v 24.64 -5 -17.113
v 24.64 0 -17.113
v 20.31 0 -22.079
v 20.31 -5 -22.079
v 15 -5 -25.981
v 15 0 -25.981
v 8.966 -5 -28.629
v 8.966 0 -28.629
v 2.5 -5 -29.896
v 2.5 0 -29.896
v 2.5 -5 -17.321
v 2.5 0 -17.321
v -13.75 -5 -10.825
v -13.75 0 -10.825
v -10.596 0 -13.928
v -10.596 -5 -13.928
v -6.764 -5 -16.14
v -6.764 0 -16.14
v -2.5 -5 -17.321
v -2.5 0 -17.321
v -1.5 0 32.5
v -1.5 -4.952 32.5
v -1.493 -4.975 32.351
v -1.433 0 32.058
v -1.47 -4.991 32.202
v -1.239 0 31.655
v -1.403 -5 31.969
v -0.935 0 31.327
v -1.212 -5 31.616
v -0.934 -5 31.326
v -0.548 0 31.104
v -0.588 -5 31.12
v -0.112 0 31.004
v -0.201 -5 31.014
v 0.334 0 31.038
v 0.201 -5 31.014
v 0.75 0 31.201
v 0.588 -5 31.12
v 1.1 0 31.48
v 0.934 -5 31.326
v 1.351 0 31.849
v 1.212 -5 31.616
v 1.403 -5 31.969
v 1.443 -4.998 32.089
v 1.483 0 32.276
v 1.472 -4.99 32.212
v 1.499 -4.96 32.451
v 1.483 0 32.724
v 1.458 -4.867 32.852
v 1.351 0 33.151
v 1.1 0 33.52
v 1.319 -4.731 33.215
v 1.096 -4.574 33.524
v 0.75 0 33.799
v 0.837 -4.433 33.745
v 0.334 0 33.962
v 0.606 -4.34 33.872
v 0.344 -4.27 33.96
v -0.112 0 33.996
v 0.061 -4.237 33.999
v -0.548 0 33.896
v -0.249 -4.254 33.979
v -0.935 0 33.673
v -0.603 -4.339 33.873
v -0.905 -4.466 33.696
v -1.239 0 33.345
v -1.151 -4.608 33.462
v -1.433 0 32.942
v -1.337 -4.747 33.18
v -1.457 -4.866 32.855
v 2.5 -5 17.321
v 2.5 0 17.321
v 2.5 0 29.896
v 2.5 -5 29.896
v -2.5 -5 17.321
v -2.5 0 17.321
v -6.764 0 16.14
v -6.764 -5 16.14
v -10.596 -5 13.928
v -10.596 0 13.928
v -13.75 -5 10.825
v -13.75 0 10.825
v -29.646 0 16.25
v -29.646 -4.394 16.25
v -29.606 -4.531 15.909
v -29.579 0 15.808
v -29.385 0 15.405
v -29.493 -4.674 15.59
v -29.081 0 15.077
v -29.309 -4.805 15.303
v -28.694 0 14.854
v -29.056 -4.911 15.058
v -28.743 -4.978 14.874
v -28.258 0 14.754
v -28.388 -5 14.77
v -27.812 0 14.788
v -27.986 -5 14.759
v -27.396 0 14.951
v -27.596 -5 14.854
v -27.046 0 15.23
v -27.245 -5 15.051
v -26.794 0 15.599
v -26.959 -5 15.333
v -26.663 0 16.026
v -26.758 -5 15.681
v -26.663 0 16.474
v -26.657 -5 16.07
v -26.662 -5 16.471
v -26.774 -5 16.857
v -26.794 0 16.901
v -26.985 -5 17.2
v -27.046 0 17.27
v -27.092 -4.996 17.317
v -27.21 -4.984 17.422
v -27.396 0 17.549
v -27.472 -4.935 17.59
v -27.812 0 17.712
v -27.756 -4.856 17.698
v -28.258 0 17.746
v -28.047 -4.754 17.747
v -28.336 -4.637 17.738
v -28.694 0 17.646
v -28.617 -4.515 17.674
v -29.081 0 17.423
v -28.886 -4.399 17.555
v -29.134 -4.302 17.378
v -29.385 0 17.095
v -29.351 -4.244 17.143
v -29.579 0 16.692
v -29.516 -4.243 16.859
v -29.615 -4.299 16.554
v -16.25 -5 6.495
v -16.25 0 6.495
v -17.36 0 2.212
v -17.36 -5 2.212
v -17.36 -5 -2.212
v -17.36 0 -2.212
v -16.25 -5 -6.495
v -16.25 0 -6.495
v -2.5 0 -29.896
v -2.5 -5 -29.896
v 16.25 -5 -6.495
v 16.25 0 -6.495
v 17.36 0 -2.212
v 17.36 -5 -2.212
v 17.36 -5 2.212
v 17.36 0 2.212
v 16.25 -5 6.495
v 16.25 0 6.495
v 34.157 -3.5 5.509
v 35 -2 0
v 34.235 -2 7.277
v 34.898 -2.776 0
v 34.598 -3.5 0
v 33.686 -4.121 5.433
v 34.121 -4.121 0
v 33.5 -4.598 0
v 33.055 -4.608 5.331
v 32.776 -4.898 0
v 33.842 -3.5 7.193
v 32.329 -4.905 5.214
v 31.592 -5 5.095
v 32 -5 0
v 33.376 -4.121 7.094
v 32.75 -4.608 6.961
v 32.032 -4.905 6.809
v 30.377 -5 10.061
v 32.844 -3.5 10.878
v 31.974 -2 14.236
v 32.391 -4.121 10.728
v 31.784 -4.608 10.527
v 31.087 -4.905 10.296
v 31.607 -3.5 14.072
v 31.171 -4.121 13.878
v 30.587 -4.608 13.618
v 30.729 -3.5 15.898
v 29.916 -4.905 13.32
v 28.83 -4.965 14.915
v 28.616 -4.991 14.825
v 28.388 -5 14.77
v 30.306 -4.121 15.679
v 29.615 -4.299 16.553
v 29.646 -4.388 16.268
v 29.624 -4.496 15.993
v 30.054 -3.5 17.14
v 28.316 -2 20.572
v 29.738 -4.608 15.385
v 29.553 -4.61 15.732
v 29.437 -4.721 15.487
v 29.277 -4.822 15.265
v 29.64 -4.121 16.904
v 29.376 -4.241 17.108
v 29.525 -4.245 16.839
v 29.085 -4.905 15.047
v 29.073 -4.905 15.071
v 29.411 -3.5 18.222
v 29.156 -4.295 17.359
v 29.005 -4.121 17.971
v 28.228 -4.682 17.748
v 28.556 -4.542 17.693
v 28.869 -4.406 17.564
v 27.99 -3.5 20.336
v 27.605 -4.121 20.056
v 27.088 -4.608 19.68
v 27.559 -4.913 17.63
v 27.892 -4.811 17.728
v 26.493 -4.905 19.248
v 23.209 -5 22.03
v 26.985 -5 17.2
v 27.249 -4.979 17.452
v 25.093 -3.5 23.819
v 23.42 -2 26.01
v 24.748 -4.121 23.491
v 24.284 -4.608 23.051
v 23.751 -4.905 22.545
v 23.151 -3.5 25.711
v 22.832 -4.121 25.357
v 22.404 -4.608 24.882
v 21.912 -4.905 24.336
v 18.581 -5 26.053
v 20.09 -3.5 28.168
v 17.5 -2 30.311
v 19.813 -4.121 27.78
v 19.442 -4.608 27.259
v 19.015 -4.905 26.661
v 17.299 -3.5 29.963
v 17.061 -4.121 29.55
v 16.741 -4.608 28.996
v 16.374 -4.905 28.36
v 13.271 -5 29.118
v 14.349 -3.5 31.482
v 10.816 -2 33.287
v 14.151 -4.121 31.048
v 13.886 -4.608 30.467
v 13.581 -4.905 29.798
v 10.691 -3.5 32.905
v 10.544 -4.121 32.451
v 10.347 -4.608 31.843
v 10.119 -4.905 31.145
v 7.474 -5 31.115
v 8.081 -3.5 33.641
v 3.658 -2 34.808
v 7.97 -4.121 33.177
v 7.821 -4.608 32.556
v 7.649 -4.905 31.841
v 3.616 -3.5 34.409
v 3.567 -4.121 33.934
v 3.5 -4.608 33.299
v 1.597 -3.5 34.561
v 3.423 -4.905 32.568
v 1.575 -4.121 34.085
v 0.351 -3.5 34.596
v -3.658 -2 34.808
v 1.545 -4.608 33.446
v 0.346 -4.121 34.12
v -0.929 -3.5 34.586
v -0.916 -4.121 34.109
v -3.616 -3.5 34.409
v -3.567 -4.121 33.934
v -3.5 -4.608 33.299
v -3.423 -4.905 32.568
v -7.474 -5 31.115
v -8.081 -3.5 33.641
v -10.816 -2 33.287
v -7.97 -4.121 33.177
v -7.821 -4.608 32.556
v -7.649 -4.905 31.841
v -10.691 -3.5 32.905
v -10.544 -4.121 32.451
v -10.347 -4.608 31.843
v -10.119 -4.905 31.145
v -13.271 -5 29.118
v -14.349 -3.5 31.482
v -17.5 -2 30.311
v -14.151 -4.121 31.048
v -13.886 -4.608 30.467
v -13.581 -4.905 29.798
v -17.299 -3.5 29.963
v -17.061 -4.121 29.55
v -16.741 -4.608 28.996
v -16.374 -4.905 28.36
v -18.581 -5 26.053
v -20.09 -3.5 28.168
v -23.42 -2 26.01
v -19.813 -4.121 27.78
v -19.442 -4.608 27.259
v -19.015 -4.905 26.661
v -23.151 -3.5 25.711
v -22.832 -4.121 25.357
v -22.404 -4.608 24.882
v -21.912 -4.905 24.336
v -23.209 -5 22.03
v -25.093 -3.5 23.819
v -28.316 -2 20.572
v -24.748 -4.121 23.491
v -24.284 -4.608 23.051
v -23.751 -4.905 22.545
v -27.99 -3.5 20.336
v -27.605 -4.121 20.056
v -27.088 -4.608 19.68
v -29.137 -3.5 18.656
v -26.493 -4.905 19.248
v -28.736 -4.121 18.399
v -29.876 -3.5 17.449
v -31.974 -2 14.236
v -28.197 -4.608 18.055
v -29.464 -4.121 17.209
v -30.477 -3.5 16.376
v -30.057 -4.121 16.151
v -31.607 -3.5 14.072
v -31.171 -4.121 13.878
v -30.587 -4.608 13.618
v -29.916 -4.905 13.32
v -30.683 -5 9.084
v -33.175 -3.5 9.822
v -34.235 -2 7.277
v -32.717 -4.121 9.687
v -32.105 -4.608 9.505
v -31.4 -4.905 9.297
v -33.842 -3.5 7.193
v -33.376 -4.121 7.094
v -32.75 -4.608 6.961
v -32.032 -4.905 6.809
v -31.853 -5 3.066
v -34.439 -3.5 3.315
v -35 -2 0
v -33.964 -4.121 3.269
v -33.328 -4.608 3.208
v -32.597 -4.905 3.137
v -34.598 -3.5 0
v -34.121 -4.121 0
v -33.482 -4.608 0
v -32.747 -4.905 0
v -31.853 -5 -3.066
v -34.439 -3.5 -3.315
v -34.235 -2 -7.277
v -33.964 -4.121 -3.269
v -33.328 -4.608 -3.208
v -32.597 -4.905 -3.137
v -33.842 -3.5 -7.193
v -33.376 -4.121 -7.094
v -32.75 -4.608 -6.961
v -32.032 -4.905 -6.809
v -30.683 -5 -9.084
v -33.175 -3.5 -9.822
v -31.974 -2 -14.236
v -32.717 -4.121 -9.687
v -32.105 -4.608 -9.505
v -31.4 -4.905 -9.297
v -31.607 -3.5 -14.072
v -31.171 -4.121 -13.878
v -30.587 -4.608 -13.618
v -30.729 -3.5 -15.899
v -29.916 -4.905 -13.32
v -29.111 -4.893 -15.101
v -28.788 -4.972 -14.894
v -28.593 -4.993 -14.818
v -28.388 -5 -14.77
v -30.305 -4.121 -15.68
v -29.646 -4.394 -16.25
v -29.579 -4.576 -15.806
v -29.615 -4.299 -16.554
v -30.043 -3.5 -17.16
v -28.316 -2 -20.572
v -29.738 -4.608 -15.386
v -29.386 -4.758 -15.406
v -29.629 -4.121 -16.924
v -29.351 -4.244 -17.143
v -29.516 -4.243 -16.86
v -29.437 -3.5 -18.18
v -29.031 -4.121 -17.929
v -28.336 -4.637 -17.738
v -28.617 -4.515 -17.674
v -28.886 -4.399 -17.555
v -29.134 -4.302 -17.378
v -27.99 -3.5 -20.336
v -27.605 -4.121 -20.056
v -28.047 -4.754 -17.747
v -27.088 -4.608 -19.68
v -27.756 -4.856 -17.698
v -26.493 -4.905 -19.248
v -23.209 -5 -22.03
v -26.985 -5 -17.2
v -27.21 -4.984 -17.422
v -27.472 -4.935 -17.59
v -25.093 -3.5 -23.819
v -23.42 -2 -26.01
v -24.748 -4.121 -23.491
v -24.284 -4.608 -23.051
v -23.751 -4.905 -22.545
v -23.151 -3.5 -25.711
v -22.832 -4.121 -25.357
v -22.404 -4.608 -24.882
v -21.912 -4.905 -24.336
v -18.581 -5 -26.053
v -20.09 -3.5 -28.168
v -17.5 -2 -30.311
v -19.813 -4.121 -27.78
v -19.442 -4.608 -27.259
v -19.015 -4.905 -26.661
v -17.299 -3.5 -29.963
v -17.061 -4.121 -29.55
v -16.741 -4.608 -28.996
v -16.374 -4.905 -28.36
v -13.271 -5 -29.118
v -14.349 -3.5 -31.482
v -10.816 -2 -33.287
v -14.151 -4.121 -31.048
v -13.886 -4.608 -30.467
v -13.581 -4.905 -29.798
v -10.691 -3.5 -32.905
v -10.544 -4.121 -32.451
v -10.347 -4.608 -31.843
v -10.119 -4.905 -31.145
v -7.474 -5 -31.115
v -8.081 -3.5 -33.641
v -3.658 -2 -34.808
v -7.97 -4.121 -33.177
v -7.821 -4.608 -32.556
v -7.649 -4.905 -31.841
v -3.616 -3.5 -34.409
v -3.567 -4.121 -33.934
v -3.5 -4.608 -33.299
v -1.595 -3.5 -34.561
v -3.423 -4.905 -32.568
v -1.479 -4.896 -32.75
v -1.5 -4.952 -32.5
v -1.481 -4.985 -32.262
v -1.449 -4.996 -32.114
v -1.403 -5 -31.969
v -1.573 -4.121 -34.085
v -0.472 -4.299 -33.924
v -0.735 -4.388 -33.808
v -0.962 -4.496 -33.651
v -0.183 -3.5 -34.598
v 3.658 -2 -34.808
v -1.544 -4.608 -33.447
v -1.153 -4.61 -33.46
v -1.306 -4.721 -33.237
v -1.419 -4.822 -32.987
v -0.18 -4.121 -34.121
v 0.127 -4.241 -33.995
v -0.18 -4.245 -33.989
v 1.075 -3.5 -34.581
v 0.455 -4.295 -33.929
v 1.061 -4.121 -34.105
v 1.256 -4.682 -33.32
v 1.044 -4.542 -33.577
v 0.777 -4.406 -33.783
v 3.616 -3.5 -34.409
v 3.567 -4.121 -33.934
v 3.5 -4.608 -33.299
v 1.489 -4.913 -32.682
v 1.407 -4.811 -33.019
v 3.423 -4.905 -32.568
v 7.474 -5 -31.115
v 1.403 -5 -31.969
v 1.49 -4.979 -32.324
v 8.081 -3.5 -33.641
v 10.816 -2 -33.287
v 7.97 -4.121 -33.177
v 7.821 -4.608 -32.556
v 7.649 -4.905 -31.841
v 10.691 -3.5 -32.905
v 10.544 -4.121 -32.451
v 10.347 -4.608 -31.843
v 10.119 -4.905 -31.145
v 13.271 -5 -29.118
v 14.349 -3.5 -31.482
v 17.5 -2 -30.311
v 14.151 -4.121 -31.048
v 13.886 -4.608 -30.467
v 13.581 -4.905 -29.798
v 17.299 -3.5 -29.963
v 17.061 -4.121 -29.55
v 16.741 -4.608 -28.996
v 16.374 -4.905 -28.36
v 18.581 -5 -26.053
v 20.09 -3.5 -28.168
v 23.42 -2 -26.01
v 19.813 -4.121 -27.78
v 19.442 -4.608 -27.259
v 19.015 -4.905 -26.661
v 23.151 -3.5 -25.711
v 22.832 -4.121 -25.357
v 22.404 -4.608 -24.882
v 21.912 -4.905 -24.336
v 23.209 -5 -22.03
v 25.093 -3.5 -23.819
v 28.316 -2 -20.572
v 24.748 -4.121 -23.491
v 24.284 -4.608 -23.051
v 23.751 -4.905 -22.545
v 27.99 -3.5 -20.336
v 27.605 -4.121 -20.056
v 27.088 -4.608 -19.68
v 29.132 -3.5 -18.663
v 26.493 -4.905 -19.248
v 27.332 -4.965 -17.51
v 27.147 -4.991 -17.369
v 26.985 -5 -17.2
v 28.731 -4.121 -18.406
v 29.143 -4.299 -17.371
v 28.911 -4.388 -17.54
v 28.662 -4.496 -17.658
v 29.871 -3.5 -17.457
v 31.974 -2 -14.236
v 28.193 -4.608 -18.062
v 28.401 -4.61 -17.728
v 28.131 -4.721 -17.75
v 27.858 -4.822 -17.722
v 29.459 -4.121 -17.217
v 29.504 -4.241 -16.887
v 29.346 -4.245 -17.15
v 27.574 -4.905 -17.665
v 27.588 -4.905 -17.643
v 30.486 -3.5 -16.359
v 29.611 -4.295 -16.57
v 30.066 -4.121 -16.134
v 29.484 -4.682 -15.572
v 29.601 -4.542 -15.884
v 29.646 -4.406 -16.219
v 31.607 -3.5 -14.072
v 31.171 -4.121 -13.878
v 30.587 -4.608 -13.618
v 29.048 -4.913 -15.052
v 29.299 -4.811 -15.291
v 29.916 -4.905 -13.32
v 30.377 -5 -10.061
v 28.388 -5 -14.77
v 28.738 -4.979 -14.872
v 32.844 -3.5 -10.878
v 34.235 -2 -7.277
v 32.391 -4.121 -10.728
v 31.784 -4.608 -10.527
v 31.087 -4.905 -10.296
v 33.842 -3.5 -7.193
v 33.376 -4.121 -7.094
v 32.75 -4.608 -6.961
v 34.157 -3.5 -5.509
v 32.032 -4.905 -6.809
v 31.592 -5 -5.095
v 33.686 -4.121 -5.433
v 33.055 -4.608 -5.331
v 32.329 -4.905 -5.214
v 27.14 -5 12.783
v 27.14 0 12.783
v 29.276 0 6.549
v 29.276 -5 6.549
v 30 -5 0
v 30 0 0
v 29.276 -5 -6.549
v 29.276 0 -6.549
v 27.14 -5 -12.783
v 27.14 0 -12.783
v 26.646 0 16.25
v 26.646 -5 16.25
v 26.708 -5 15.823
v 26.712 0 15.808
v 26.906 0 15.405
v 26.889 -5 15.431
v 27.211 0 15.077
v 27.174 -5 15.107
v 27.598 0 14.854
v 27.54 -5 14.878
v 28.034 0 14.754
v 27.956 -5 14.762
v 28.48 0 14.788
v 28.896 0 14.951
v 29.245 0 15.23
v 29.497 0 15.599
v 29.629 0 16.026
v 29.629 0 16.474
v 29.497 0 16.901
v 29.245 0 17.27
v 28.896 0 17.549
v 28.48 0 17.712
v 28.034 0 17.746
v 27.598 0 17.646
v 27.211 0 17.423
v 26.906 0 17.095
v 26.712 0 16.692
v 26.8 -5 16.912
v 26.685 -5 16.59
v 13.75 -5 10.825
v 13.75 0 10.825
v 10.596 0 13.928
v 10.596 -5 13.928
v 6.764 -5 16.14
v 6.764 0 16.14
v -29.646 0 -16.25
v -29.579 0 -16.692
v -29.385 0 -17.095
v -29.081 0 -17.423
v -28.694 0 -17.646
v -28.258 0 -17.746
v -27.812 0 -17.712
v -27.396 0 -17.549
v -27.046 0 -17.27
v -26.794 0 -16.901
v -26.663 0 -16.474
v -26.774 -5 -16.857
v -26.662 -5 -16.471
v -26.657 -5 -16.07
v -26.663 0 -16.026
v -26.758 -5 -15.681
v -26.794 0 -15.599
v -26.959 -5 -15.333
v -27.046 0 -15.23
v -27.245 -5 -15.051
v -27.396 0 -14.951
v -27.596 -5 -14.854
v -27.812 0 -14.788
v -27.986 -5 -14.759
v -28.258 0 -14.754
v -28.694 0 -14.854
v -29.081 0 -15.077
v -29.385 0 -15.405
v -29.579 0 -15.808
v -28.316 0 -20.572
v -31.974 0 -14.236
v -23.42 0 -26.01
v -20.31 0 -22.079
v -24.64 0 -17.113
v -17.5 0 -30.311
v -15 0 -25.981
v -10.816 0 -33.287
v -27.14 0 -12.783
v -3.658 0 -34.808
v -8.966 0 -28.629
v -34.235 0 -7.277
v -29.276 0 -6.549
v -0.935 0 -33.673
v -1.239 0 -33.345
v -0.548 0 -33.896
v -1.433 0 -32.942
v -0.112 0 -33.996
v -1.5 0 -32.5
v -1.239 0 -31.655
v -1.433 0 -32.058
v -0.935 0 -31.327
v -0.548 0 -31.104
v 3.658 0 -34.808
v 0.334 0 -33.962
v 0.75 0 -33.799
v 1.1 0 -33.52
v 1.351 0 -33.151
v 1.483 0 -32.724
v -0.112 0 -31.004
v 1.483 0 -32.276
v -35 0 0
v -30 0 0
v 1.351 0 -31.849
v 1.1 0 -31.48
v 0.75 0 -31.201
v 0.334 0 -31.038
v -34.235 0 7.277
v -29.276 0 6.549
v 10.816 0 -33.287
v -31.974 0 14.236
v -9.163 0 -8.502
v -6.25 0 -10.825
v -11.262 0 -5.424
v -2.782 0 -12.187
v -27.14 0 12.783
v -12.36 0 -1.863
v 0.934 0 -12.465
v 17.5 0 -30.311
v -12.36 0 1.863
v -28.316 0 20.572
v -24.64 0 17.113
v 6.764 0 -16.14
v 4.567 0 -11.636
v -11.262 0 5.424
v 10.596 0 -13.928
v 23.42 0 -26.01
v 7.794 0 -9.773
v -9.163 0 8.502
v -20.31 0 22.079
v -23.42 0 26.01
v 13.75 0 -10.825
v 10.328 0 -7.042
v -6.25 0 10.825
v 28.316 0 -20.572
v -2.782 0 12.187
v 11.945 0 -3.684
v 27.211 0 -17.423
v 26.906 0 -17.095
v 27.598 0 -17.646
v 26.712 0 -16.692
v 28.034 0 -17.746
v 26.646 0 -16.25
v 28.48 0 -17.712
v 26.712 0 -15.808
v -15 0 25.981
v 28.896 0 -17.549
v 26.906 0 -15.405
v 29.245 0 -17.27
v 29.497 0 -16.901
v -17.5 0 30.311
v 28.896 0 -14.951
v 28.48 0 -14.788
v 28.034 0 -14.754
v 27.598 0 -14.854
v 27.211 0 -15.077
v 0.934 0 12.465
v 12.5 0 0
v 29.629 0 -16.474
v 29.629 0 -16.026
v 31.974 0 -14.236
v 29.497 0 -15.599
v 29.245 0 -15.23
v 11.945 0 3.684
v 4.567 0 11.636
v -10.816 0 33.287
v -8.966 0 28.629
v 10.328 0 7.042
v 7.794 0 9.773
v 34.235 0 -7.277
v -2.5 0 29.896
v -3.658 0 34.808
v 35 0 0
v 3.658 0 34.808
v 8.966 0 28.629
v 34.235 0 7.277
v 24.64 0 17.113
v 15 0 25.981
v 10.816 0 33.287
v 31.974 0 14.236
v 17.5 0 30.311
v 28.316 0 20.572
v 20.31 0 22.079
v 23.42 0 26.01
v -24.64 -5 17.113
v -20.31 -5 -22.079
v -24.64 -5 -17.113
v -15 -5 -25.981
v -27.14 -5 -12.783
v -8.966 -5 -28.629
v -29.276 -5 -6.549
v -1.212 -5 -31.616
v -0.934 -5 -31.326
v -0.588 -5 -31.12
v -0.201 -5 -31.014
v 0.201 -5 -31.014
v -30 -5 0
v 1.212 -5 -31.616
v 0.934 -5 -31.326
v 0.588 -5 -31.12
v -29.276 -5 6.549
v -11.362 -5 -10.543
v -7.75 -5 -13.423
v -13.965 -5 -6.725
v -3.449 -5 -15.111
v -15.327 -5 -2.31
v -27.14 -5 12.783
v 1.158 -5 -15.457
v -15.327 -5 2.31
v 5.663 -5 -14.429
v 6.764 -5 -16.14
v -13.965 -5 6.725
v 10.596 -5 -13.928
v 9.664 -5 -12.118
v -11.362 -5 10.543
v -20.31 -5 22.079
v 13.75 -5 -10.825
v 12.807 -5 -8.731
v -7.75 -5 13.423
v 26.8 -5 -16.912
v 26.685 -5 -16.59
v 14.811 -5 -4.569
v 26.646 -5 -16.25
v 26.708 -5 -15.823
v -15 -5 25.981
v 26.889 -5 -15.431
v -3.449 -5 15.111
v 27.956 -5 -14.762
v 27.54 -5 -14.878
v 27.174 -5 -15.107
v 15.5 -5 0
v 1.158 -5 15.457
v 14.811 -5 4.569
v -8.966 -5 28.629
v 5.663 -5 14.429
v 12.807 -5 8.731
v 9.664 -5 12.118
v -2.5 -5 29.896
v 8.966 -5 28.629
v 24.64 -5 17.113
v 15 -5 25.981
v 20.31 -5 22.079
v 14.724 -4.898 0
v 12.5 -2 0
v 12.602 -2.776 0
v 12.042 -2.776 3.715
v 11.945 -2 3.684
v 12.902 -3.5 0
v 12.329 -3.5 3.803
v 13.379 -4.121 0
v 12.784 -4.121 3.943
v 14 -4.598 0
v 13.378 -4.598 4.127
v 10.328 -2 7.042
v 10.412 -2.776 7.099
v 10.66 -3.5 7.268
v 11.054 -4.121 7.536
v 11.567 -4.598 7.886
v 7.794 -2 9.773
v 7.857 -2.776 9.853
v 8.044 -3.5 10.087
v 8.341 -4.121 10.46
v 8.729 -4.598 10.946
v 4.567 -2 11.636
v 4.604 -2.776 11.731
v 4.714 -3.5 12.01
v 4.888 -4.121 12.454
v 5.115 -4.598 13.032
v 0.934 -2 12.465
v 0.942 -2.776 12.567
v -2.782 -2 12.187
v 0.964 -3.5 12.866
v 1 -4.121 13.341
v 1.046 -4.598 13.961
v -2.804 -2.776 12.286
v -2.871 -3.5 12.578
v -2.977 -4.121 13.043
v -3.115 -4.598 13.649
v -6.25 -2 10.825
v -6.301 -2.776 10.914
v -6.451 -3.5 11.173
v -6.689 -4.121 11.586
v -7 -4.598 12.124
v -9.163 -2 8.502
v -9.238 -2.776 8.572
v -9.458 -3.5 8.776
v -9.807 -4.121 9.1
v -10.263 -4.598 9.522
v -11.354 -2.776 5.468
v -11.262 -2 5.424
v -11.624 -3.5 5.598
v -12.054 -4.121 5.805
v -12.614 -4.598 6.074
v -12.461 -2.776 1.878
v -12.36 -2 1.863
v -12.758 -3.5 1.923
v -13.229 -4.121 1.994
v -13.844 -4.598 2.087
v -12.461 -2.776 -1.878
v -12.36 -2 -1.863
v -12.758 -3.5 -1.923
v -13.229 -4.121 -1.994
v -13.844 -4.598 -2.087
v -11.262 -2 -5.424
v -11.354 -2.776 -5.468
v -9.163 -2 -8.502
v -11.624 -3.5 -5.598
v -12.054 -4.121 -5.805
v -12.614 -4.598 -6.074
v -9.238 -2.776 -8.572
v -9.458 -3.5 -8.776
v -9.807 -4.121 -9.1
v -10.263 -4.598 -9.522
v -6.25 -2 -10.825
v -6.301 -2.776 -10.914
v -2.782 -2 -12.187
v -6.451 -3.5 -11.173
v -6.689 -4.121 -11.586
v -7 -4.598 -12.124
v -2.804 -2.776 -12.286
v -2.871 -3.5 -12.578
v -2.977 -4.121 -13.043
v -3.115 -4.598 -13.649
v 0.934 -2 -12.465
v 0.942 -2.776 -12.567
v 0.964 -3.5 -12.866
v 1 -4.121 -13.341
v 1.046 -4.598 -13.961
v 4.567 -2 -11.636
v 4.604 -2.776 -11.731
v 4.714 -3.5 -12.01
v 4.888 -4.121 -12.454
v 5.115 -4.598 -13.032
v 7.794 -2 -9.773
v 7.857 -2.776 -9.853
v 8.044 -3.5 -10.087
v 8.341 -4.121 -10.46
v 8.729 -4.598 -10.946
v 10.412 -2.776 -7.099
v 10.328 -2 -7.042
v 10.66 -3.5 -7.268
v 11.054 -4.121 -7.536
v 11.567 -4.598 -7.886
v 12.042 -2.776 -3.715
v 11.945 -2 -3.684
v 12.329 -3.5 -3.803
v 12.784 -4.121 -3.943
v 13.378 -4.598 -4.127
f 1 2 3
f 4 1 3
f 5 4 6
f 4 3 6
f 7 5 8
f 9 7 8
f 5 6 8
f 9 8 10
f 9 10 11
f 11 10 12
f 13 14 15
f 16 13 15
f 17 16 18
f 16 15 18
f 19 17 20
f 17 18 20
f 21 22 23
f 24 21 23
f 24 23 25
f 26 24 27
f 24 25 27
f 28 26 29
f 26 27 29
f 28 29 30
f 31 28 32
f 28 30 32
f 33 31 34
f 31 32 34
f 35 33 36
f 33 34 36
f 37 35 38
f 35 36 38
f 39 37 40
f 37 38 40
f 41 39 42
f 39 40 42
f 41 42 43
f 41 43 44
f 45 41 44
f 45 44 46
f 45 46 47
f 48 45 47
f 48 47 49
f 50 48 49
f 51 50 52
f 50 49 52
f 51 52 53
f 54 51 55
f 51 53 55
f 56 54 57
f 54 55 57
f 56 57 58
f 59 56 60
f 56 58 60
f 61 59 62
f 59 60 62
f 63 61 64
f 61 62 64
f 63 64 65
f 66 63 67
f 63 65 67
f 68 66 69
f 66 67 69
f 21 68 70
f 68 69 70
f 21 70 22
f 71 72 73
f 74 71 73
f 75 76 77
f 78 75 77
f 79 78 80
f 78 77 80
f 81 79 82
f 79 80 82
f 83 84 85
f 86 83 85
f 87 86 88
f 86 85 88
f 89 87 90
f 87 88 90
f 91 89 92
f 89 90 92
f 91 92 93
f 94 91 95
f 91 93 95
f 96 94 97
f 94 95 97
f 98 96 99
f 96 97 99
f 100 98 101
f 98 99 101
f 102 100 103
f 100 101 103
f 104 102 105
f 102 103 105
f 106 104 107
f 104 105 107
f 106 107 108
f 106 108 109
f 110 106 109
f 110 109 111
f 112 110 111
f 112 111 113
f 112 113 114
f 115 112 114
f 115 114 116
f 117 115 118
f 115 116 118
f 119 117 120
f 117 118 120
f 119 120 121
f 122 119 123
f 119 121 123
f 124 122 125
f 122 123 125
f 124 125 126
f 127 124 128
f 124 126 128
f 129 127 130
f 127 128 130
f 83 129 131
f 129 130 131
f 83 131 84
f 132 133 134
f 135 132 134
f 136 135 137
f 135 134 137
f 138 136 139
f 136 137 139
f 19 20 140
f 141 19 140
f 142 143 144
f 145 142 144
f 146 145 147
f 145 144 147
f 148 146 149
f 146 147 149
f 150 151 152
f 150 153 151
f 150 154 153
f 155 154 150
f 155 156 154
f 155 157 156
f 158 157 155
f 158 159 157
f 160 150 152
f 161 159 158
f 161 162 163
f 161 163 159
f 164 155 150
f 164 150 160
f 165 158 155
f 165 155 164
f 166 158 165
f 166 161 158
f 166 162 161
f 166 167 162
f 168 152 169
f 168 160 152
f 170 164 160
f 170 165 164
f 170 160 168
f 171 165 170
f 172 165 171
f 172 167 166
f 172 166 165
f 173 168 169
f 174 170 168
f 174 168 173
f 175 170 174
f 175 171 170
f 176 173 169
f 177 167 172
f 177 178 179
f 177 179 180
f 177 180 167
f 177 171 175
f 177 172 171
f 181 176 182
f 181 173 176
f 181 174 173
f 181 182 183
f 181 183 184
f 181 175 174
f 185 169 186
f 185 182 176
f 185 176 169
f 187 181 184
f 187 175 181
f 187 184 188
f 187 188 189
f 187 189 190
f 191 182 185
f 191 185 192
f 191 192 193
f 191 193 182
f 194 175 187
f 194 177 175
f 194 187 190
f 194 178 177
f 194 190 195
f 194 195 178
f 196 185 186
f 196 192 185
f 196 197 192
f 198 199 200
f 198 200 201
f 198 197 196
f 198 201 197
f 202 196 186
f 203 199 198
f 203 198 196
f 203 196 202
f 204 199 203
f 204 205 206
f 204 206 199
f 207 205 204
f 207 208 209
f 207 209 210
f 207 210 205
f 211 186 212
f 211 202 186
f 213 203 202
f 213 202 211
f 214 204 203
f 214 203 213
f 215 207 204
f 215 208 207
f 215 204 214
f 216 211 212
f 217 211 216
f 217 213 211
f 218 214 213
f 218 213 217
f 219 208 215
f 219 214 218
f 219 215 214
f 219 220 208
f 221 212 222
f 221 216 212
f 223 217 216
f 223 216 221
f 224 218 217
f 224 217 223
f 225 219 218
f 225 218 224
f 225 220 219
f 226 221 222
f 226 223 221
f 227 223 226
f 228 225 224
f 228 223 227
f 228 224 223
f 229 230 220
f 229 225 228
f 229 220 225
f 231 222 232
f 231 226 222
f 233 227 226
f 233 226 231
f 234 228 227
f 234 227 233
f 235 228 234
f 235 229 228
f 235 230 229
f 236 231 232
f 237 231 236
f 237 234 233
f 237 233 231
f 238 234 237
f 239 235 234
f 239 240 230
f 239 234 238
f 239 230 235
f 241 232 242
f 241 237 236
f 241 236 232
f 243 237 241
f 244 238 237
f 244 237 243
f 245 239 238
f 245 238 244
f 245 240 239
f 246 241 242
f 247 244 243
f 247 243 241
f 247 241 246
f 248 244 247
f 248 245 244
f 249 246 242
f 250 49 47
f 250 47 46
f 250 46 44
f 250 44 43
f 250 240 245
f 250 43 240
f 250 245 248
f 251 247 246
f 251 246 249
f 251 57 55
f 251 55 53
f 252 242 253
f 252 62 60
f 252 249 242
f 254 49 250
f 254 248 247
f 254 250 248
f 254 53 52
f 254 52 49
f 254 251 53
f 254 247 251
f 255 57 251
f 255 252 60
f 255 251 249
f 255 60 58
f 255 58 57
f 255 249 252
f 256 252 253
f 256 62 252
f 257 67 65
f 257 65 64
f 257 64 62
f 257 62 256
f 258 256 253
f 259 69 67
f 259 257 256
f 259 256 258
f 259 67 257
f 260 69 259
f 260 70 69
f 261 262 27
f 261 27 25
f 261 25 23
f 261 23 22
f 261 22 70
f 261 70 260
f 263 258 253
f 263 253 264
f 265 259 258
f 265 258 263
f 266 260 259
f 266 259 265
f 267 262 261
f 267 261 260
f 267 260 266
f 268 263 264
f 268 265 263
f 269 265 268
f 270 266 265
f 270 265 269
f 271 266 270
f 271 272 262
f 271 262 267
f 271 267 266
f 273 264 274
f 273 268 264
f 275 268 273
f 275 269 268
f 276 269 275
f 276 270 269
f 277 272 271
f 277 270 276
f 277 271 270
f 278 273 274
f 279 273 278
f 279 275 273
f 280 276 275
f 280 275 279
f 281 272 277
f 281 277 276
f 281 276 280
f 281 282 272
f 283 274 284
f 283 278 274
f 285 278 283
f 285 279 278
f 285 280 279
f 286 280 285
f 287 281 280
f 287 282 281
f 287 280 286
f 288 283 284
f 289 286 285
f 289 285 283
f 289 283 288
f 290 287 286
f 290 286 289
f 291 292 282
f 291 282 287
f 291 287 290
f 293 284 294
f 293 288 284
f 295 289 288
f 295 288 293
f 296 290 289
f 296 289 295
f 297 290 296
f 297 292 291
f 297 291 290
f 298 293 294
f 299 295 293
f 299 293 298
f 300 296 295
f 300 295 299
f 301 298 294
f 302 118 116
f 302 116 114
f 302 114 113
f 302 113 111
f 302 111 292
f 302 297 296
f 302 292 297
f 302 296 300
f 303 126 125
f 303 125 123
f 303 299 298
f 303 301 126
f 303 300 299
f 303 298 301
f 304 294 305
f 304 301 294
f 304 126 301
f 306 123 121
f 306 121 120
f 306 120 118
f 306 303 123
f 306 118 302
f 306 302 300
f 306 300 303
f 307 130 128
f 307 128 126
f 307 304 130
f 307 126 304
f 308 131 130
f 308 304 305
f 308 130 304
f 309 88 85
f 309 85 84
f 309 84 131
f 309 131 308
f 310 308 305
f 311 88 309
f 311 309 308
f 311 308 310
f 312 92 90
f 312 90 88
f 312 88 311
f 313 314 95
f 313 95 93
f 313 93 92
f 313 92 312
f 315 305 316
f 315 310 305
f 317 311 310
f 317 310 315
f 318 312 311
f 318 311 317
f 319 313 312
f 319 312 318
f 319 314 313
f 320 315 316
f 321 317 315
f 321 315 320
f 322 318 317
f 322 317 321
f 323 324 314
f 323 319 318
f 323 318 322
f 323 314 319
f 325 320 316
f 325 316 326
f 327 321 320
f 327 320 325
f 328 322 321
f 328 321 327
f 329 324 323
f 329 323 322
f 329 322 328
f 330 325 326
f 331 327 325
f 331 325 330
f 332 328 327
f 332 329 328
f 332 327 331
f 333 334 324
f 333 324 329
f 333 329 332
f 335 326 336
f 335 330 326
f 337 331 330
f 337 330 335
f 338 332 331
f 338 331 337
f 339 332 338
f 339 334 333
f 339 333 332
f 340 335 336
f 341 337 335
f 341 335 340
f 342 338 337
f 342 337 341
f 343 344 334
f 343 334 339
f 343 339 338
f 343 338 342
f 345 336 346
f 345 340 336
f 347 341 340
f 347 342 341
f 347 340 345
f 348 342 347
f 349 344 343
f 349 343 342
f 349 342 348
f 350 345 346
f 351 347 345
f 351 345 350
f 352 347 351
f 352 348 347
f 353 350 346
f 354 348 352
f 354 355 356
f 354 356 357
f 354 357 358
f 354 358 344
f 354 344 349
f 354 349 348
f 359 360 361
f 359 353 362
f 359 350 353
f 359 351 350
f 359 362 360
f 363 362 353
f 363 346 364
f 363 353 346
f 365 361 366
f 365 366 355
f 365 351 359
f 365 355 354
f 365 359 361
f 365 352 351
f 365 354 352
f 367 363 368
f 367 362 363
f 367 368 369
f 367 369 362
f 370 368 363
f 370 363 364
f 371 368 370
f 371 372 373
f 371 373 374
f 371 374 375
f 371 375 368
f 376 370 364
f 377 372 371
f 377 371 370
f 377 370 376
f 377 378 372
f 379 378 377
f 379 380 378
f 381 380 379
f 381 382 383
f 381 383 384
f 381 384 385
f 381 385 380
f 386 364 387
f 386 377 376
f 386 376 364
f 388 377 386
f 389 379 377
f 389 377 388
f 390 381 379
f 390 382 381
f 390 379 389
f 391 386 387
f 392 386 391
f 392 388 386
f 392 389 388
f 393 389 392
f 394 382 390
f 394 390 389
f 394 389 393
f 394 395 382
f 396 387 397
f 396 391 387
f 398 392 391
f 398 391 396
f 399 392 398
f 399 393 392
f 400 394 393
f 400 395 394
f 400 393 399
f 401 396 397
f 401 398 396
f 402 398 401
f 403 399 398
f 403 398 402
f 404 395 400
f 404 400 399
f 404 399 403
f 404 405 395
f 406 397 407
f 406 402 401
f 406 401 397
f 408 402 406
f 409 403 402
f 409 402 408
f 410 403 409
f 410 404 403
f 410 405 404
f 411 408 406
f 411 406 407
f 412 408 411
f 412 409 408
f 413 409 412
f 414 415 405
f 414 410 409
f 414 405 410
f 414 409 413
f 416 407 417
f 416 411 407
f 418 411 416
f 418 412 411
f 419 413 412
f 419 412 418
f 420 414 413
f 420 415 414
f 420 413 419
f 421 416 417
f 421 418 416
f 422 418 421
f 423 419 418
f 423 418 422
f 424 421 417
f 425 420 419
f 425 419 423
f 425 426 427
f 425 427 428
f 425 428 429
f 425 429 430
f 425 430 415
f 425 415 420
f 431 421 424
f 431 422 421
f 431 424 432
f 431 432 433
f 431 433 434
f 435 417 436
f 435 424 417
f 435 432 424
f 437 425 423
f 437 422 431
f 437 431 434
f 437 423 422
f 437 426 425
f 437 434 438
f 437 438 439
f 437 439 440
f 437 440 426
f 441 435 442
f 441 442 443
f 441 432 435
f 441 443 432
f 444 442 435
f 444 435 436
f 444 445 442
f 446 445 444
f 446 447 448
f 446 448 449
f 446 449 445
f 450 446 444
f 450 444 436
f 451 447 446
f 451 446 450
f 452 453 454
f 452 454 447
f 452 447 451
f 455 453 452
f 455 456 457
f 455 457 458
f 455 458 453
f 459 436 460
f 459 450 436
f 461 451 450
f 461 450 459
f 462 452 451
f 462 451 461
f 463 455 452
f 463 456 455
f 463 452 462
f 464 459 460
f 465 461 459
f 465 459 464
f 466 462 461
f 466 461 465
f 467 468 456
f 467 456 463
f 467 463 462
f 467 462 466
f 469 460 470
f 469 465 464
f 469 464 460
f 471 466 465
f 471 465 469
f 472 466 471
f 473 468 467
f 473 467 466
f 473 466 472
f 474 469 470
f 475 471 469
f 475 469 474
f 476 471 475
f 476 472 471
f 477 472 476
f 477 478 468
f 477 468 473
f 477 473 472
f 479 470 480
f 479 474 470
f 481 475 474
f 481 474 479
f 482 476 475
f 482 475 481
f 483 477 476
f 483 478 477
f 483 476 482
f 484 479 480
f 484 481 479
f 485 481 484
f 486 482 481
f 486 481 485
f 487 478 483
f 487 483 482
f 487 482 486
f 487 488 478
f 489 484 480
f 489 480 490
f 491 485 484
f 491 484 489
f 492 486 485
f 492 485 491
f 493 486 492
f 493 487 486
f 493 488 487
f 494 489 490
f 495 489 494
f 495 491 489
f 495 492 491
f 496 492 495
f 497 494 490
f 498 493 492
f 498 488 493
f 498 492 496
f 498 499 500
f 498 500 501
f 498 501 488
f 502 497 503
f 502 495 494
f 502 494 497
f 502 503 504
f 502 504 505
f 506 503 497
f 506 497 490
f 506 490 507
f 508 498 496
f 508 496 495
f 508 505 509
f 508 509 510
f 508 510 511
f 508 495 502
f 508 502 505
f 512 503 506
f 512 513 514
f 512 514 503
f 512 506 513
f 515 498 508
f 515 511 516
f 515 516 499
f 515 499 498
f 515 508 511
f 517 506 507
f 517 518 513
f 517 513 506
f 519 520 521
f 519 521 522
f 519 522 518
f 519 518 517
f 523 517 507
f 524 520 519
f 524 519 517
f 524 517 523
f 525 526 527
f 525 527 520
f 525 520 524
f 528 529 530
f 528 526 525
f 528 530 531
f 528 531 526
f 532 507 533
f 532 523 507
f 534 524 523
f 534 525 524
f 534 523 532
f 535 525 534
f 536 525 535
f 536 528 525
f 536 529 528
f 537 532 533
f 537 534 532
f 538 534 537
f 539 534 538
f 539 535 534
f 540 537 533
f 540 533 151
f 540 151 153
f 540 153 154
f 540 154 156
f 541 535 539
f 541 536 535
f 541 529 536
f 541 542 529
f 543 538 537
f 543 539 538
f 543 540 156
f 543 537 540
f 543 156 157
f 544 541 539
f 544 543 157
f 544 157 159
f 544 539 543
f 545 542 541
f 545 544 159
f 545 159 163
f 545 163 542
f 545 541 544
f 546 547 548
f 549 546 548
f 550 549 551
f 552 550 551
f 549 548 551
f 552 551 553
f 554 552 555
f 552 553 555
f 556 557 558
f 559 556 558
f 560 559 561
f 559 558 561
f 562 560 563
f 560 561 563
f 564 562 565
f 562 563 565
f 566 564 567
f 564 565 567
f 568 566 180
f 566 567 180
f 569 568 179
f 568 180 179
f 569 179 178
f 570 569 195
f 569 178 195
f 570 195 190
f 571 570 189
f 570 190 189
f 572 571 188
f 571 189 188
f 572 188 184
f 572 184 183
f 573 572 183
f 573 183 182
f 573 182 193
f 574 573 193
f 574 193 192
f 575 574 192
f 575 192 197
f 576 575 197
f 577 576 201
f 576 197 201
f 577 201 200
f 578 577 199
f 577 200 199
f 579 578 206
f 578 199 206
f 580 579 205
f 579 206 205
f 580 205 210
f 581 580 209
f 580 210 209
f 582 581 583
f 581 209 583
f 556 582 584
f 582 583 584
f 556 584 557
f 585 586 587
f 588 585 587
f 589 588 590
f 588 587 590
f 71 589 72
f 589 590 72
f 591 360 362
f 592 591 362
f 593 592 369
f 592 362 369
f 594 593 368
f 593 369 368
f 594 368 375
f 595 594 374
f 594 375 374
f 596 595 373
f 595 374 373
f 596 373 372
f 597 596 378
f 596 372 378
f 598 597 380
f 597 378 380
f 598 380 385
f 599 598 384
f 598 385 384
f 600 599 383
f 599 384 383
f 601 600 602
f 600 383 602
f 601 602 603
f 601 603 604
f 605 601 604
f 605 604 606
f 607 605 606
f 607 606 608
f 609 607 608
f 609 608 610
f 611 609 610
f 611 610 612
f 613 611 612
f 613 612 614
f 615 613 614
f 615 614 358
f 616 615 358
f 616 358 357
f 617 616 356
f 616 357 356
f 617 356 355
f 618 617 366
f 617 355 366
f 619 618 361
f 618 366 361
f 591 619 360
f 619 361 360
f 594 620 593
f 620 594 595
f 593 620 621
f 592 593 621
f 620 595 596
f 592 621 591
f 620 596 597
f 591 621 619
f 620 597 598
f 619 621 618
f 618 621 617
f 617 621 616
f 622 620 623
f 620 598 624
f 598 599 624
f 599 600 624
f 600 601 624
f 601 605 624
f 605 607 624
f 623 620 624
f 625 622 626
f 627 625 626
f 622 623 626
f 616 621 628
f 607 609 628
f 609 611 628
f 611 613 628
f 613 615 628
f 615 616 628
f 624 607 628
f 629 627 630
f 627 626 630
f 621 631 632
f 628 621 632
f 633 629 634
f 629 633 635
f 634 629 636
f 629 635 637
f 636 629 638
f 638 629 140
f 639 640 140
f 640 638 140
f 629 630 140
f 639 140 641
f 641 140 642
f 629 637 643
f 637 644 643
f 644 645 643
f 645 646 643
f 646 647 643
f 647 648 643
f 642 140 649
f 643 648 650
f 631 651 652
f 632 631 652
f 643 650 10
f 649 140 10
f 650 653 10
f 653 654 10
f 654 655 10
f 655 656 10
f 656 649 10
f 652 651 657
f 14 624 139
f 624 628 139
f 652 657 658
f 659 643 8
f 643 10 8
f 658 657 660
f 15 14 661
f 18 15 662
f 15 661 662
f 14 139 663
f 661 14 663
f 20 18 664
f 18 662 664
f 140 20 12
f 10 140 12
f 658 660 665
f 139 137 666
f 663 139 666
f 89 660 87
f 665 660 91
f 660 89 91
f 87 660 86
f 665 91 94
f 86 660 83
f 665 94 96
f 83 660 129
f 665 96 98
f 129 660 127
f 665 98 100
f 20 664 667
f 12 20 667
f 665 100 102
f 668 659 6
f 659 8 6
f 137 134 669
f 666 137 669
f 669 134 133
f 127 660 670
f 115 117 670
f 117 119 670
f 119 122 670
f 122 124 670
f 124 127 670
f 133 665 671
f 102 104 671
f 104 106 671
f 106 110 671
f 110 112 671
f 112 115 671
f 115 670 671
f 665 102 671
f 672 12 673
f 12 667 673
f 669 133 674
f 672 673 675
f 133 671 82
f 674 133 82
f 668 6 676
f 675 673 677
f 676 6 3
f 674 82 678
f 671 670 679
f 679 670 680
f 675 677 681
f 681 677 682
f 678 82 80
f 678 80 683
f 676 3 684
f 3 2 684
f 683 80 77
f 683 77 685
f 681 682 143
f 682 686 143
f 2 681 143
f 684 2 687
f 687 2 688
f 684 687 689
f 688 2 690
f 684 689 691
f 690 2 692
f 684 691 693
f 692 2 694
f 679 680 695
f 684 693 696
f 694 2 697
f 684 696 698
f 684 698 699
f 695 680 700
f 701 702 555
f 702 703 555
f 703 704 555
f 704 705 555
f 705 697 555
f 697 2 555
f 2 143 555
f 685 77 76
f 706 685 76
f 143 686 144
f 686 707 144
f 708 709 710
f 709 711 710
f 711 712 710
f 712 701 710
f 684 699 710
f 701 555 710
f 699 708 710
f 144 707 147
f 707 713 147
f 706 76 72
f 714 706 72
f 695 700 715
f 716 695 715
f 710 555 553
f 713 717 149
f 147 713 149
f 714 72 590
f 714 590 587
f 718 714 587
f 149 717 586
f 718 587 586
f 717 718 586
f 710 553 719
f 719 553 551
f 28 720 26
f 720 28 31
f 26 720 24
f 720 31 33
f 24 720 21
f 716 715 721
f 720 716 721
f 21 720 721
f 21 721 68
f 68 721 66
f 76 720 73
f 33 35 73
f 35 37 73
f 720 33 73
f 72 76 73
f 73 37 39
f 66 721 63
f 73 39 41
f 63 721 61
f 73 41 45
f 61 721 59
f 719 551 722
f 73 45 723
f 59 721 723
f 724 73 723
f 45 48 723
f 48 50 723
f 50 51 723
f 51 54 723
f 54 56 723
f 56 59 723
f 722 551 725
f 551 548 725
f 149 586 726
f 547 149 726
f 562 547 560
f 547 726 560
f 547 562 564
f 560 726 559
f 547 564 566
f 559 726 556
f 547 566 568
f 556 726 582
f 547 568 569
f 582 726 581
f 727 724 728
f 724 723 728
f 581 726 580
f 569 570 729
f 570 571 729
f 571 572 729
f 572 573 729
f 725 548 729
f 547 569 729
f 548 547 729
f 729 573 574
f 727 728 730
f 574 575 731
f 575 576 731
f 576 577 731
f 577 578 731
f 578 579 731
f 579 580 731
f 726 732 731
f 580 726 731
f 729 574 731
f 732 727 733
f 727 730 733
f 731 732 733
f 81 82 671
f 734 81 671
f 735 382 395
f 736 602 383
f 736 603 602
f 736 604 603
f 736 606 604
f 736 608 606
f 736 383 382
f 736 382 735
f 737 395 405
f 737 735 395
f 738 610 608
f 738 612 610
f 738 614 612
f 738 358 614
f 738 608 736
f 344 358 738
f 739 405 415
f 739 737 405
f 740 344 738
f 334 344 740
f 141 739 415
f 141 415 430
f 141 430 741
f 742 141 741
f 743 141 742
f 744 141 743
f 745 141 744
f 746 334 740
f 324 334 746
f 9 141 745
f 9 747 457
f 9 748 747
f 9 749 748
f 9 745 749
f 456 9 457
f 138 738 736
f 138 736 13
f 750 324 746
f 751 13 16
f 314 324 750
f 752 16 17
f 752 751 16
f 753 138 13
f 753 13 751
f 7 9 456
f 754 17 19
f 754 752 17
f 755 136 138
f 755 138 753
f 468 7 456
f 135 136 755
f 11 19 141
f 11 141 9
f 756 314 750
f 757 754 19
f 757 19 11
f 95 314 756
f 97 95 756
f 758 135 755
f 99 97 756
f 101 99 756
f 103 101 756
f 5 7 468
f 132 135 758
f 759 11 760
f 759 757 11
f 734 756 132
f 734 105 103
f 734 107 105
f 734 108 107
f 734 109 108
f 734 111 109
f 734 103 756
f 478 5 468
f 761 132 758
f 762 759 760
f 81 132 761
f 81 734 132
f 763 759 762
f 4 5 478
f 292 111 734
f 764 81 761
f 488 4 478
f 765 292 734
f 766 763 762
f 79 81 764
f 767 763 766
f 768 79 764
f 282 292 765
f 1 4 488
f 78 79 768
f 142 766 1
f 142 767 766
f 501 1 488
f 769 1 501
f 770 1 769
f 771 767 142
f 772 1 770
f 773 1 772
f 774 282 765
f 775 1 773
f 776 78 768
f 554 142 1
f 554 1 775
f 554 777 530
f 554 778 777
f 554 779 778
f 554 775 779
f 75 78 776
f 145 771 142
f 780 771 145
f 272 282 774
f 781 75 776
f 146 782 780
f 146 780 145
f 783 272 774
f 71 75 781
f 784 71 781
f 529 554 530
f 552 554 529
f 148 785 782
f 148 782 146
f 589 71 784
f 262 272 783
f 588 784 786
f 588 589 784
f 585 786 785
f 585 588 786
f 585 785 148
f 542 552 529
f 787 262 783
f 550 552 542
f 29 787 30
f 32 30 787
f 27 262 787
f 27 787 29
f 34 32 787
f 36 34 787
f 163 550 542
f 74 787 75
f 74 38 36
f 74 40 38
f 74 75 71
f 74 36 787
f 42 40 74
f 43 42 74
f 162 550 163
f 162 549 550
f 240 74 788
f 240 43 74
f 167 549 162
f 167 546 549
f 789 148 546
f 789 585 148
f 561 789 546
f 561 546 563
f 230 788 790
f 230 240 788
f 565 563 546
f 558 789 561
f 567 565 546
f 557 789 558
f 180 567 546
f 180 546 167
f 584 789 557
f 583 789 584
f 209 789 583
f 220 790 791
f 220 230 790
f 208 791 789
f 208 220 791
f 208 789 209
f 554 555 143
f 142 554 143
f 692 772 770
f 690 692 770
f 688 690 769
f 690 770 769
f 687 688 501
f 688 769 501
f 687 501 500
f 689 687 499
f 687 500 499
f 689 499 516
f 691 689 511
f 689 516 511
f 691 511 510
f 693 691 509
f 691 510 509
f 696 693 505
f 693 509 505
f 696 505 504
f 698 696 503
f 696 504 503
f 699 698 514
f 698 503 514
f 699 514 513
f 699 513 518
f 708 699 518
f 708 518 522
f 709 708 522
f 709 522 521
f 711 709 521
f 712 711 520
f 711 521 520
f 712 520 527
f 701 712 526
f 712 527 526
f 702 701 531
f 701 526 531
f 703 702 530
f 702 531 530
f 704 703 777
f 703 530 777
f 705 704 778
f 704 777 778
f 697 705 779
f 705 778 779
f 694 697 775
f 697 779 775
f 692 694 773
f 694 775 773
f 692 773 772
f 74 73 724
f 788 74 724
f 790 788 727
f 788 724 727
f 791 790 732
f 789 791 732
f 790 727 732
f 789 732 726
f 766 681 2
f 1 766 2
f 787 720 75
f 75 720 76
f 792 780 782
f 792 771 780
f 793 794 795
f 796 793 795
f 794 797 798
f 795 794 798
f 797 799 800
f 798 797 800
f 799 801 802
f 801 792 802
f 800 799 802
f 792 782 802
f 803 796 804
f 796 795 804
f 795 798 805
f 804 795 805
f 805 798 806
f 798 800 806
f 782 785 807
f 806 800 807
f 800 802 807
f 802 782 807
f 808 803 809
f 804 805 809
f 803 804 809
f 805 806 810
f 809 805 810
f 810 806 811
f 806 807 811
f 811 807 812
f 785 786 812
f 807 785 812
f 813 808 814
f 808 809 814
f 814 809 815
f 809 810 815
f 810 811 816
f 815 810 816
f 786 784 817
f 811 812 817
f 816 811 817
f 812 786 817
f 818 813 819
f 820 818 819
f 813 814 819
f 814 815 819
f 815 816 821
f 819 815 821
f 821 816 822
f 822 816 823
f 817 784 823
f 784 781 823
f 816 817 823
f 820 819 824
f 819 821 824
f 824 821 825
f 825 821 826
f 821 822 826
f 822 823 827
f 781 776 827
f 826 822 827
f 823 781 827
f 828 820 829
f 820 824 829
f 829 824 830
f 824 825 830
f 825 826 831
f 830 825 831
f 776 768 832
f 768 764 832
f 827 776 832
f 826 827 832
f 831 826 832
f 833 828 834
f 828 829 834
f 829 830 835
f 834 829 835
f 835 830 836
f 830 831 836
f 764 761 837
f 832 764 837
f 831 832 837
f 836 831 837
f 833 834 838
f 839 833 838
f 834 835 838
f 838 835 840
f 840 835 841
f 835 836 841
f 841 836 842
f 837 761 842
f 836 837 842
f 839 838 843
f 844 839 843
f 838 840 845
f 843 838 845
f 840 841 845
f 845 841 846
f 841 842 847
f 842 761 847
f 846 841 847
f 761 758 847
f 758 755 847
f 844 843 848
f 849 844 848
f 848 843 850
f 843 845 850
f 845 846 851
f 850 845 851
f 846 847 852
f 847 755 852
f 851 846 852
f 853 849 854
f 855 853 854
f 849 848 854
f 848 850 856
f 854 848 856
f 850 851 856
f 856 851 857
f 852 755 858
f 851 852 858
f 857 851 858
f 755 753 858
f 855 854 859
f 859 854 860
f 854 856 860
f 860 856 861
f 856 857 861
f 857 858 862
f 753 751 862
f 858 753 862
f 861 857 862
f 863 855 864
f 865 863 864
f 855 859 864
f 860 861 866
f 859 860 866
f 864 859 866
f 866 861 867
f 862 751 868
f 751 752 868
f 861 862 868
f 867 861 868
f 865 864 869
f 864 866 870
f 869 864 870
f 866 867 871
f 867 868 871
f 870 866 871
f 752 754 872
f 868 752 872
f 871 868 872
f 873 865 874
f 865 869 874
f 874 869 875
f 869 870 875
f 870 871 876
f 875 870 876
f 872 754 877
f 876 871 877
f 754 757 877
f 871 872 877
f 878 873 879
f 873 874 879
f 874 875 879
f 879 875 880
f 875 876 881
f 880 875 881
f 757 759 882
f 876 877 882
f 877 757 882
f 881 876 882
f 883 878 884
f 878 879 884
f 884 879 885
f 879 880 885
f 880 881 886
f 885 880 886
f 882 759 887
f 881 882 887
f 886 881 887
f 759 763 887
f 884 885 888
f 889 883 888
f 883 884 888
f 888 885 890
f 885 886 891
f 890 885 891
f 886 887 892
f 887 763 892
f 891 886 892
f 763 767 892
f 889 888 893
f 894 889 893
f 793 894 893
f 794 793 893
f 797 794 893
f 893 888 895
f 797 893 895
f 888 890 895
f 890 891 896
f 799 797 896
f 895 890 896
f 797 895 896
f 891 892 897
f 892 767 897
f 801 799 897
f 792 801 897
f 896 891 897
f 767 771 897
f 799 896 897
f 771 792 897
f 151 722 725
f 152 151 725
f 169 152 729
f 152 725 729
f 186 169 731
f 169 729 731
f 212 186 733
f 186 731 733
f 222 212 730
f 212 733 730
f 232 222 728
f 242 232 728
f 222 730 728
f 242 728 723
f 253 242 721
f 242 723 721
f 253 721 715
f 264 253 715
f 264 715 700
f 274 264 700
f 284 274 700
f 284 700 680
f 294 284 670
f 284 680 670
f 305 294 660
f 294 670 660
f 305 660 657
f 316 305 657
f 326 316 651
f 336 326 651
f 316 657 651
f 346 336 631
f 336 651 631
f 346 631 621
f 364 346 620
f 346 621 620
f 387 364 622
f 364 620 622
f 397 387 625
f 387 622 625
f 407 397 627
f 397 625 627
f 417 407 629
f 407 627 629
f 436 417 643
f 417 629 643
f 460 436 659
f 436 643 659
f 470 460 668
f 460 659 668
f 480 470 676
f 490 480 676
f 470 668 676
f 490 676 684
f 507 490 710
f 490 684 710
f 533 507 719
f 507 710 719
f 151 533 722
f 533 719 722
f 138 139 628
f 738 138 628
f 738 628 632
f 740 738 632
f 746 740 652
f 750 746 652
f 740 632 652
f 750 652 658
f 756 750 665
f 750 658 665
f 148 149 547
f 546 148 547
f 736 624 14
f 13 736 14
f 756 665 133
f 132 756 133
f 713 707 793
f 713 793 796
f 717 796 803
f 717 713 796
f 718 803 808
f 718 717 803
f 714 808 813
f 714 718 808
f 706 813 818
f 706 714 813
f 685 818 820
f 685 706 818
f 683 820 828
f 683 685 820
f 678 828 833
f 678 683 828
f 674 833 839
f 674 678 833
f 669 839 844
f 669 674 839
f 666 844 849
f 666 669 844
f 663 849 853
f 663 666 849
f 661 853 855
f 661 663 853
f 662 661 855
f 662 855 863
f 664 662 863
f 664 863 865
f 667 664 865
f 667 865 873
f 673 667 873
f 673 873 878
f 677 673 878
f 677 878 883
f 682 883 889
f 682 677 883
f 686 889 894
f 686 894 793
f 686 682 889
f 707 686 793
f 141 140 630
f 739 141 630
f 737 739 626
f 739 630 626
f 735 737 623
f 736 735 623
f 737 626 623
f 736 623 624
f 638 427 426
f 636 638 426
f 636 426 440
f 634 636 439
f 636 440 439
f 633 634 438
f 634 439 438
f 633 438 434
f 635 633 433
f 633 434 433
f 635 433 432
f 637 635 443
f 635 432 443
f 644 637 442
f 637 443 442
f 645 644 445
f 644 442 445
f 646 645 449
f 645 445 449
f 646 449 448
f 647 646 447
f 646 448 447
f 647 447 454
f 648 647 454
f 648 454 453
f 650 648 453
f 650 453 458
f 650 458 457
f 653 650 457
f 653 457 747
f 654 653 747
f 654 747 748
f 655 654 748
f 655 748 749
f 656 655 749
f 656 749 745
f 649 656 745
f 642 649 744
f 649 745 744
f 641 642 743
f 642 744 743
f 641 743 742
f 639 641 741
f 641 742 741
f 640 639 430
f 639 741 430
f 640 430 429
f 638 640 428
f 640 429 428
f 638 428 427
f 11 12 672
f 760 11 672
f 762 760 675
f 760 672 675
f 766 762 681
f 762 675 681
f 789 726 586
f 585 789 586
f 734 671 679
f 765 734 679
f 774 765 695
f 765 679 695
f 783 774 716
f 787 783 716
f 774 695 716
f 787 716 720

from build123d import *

# Parameters (mm, degrees)
F0_R     = 35
F0_R_2   = 12.5
F1_DEPTH = 5
F2_R     = 3
F3_D     = 3


with BuildPart() as f1:
    # F0 (on Front) → F1 (new body)
    with BuildSketch(Plane.XZ):
        Circle(F0_R)
        with BuildLine():
            Line((-24.640394, -17.112889), (-13.75, -10.825318))
            ThreePointArc((-13.75, -10.825318), (-8.75, -15.155445), (-2.5, -17.320508))
            Line((-2.5, -17.320508), (-2.5, -29.895652))
            ThreePointArc((-2.5, -29.895652), (-15, -25.980762), (-24.640394, -17.112889))
        make_face(mode=Mode.SUBTRACT)
        with BuildLine():
            Line((2.5, -29.895652), (2.5, -17.320508))
            ThreePointArc((2.5, -17.320508), (8.75, -15.155445), (13.75, -10.825318))
            Line((13.75, -10.825318), (24.640394, -17.112889))
            ThreePointArc((24.640394, -17.112889), (15, -25.980762), (2.5, -29.895652))
        make_face(mode=Mode.SUBTRACT)
        with BuildLine():
            Line((27.140394, -12.782762), (16.25, -6.495191))
            ThreePointArc((16.25, -6.495191), (17.5, 0), (16.25, 6.495191))
            Line((16.25, 6.495191), (27.140394, 12.782762))
            ThreePointArc((27.140394, 12.782762), (30, 0), (27.140394, -12.782762))
        make_face(mode=Mode.SUBTRACT)
        with BuildLine():
            ThreePointArc((-27.140394, -12.782762), (-30, 0), (-27.140394, 12.782762))
            Line((-27.140394, 12.782762), (-16.25, 6.495191))
            ThreePointArc((-16.25, 6.495191), (-17.5, 0), (-16.25, -6.495191))
            Line((-16.25, -6.495191), (-27.140394, -12.782762))
        make_face(mode=Mode.SUBTRACT)
        with BuildLine():
            Line((-2.5, 29.895652), (-2.5, 17.320508))
            ThreePointArc((-2.5, 17.320508), (-8.75, 15.155445), (-13.75, 10.825318))
            Line((-13.75, 10.825318), (-24.640394, 17.112889))
            ThreePointArc((-24.640394, 17.112889), (-15, 25.980762), (-2.5, 29.895652))
        make_face(mode=Mode.SUBTRACT)
        Circle(F0_R_2, mode=Mode.SUBTRACT)
        with BuildLine():
            ThreePointArc((13.75, 10.825318), (8.75, 15.155445), (2.5, 17.320508))
            Line((2.5, 17.320508), (2.5, 29.895652))
            ThreePointArc((2.5, 29.895652), (15, 25.980762), (24.640394, 17.112889))
            Line((24.640394, 17.112889), (13.75, 10.825318))
        make_face(mode=Mode.SUBTRACT)
    extrude(amount=F1_DEPTH)

    # F2
    f2_edges = [f1.edges().sort_by_distance(p)[0] for p in [
        (-35, -5, 0),
        (-12.5, -5, 0),
    ]]
    fillet(f2_edges, radius=F2_R)

    # F3 (through all)
    with Locations(Plane(origin=(0, 0, 0), x_dir=(1, 0, 0), z_dir=(0, 1, 0))):
        with Locations((-28.145826, -16.25), (-28.145826, 16.25), (0, 32.5), (28.145826, 16.25), (28.145826, -16.25), (0, -32.5)):
            Hole(F3_D / 2)


solid = f1.part
